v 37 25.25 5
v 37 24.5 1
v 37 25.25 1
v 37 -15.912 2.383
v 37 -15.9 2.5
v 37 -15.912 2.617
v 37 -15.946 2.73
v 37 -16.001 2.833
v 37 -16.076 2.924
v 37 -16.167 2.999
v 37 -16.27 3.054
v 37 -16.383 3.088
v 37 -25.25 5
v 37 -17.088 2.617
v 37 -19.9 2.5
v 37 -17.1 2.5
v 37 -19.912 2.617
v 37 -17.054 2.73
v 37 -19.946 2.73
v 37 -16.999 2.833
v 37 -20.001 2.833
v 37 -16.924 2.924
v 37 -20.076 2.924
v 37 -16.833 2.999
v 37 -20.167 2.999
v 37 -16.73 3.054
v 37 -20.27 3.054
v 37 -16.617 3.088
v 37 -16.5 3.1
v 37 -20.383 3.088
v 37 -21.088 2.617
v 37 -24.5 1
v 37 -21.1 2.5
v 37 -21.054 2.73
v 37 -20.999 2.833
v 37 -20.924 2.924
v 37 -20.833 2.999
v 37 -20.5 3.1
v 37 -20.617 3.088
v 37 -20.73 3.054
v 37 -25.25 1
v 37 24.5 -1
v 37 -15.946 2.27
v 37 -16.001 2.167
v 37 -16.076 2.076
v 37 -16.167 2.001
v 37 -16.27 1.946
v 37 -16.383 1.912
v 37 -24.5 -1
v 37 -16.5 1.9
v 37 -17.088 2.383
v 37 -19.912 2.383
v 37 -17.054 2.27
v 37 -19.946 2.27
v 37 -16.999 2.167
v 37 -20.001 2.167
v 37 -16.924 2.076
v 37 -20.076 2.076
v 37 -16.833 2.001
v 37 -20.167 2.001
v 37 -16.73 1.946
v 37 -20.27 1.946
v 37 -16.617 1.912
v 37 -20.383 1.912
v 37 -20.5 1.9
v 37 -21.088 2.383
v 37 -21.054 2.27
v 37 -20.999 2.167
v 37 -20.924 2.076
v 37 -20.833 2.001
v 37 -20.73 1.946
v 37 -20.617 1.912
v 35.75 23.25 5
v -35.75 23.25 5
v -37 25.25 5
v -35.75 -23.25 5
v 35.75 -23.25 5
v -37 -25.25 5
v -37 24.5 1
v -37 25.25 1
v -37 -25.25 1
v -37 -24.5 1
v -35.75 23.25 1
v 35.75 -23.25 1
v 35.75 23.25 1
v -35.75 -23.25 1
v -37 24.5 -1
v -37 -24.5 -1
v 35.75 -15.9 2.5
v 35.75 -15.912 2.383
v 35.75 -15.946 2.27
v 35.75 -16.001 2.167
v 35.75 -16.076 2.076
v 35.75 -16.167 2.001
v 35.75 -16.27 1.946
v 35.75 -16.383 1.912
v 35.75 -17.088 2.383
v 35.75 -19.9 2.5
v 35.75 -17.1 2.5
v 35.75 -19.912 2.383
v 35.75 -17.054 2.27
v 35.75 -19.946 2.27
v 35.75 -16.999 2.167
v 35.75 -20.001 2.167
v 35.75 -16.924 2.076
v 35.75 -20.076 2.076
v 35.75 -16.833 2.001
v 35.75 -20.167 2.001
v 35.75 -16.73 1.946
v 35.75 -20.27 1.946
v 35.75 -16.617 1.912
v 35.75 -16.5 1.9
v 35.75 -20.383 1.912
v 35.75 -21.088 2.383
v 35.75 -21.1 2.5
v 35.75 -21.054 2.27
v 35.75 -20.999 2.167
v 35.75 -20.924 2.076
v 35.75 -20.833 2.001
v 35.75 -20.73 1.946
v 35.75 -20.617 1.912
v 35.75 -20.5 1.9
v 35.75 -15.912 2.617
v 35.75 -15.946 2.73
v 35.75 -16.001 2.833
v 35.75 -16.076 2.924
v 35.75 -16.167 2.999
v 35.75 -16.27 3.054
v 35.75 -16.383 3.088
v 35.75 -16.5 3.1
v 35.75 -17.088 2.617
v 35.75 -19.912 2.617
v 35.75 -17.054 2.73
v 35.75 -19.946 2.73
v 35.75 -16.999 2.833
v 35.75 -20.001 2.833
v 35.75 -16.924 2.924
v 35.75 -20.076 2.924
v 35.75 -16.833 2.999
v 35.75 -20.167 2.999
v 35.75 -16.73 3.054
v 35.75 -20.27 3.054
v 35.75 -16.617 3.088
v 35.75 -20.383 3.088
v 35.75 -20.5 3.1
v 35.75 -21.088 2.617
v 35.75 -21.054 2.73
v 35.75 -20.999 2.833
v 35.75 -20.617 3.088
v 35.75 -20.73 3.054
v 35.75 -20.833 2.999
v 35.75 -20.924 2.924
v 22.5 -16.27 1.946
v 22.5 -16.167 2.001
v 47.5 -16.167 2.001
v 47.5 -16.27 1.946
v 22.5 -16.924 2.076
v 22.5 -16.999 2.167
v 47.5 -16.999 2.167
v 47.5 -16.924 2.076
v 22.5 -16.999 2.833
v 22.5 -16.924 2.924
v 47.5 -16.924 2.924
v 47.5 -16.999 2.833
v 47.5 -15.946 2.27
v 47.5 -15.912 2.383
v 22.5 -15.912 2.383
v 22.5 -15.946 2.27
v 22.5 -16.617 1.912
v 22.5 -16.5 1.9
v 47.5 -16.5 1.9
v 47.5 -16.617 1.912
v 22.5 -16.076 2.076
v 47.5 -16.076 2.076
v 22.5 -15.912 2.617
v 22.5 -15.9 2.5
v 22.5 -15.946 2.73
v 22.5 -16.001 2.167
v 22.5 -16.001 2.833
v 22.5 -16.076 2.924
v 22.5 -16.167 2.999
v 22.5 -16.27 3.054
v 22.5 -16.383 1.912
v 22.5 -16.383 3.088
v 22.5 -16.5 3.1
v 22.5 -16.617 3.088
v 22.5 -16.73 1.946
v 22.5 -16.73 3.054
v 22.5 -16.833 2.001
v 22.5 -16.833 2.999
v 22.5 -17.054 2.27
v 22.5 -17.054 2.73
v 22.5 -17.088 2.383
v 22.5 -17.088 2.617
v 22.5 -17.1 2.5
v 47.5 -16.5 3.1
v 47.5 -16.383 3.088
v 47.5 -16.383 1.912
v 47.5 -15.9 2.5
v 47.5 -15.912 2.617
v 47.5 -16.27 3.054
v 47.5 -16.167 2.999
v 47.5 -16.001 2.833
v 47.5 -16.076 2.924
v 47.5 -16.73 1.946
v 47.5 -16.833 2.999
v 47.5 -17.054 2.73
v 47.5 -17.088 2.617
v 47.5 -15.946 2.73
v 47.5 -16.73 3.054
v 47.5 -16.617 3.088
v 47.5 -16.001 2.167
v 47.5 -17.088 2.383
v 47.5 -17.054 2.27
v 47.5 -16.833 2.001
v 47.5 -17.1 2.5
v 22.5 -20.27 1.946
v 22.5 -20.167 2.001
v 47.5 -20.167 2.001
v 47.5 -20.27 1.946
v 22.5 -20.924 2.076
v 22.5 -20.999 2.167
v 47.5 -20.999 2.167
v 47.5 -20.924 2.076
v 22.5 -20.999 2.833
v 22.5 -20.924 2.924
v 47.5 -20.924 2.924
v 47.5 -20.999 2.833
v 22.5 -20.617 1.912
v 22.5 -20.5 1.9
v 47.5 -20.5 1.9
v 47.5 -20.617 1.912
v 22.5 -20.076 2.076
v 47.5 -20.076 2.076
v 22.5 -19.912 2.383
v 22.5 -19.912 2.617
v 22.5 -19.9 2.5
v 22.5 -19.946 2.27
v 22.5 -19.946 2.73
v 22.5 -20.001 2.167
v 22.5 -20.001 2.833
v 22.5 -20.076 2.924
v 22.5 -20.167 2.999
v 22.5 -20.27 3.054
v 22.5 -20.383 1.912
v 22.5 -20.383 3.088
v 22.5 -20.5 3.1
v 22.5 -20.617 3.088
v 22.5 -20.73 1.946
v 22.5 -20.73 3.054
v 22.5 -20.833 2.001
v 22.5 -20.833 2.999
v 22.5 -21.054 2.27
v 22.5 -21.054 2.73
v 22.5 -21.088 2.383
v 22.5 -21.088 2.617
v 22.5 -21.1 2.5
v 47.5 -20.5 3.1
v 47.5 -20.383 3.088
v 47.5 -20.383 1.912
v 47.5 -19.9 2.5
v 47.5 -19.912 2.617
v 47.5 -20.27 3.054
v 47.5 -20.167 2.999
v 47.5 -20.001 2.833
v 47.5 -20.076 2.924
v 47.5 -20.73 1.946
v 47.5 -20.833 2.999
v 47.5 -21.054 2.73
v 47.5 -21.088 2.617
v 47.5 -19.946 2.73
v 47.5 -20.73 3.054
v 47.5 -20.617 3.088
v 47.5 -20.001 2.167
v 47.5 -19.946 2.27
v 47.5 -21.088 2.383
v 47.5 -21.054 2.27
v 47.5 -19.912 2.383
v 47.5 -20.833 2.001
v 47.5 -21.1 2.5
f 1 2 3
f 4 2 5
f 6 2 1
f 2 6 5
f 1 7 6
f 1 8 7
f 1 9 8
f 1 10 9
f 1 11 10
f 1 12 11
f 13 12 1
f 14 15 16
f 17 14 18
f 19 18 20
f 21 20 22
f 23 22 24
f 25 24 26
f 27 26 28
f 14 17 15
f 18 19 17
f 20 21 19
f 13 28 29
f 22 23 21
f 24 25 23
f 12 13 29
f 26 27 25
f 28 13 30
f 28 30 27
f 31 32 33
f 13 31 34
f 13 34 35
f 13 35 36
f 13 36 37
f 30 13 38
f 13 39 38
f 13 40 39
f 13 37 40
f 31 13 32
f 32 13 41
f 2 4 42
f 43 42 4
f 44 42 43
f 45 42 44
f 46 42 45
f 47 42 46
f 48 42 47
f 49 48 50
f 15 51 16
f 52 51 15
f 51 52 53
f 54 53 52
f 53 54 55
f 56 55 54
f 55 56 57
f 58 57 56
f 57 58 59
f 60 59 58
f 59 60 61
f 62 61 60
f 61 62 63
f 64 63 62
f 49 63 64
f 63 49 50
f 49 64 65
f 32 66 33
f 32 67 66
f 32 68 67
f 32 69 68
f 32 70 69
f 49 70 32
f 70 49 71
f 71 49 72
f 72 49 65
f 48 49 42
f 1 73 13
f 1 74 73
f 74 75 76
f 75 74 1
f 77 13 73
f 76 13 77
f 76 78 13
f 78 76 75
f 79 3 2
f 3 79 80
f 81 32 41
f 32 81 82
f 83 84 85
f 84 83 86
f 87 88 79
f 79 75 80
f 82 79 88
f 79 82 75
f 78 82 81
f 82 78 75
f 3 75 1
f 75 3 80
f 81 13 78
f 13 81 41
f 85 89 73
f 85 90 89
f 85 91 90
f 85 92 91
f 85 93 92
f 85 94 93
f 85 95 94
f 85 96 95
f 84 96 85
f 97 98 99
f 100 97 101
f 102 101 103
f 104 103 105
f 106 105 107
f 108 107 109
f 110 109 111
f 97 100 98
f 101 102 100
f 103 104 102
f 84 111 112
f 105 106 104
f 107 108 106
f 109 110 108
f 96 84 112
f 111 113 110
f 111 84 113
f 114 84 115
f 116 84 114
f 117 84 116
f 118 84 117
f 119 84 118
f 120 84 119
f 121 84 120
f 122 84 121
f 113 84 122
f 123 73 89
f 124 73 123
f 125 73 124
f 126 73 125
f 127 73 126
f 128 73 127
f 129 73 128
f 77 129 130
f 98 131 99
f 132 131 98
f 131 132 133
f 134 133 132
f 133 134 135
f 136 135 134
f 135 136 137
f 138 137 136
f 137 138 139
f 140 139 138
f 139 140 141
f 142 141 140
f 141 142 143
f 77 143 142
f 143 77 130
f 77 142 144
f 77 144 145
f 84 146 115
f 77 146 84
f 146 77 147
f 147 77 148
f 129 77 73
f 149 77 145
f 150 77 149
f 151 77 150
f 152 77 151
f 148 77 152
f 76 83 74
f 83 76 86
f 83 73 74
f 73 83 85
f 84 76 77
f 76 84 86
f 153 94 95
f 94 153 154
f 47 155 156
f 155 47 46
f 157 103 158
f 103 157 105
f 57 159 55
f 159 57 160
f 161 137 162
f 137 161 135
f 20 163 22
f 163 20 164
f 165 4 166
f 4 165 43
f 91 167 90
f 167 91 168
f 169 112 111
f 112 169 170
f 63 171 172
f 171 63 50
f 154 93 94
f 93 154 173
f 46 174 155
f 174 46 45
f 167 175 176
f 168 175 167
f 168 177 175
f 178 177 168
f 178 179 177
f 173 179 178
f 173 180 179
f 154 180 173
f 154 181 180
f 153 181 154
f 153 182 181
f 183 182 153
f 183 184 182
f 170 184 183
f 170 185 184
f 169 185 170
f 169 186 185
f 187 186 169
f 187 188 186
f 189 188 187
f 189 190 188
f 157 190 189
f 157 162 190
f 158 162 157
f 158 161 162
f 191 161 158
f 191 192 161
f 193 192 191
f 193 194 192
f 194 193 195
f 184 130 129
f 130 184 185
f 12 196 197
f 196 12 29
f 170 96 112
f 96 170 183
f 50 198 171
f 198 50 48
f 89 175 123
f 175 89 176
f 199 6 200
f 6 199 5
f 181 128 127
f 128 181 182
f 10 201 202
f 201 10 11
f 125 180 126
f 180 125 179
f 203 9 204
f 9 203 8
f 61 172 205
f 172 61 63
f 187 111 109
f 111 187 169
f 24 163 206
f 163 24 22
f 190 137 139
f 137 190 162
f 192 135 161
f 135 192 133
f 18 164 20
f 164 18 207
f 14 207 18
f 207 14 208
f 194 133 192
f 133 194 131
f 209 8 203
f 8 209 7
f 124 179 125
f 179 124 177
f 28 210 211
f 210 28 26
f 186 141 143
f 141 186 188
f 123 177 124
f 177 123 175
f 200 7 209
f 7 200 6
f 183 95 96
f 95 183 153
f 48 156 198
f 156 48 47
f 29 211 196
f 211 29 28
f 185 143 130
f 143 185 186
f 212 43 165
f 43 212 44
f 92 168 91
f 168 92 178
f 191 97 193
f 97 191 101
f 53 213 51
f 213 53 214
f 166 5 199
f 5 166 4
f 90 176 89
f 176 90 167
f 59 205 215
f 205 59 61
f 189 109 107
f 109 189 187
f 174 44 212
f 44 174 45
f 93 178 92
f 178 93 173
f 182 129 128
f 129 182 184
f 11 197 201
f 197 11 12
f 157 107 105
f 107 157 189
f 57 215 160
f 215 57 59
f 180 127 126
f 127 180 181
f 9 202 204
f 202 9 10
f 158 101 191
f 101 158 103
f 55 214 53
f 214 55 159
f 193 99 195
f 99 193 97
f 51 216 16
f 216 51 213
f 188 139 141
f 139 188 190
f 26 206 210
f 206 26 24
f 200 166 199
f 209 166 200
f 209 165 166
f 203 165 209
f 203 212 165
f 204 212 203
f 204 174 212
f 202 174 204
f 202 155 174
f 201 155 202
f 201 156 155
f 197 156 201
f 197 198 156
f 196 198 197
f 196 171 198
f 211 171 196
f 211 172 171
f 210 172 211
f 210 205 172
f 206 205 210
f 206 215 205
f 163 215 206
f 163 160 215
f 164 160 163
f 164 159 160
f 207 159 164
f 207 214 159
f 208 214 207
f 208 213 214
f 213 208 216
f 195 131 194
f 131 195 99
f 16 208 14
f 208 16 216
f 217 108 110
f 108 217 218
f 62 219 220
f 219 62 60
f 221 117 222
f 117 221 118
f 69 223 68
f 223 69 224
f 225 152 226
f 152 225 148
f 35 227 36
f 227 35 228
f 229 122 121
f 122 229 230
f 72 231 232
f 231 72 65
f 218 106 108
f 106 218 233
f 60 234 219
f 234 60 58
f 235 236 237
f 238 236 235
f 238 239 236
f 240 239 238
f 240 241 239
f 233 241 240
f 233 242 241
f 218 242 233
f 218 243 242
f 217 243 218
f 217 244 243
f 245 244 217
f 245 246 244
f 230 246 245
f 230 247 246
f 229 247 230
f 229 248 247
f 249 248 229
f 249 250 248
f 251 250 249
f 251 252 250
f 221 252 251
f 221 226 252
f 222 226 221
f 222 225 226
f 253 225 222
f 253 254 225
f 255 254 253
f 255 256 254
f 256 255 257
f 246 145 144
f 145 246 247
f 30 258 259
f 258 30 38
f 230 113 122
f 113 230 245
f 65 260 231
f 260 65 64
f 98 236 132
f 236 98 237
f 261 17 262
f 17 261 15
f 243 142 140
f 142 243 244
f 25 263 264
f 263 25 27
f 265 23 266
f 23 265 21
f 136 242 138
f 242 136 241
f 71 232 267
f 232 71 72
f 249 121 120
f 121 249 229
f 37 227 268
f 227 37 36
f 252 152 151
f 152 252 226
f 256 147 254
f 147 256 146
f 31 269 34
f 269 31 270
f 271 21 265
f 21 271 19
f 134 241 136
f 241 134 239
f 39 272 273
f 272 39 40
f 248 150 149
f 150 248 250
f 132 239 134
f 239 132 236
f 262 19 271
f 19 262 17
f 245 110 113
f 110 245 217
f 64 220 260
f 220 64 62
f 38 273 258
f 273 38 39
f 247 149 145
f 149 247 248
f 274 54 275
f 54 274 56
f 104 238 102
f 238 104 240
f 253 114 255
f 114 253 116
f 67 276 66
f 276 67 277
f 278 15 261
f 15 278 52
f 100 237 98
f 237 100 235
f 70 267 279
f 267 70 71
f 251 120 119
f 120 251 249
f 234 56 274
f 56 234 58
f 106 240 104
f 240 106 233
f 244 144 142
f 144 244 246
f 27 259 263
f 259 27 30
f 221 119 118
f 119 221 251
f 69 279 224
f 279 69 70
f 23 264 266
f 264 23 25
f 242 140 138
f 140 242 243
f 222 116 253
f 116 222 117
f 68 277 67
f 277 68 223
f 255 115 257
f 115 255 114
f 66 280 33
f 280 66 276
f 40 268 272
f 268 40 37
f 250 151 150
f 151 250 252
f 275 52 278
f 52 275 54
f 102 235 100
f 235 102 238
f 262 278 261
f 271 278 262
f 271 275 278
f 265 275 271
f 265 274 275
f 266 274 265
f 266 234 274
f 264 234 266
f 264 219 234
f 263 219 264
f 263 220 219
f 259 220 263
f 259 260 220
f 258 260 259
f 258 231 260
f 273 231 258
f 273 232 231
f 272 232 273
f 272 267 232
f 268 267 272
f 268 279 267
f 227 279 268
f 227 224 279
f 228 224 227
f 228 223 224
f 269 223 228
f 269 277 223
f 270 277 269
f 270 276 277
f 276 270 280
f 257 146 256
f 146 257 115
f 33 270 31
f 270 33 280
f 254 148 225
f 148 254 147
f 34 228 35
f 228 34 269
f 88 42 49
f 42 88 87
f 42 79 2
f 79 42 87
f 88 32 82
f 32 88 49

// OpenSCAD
// file: akkum18650.scad
echo("Ропацкий Евгений Влдаимирович");
d_akkum = 19;
h_akkum = 65;

akkum18650_set();

module akkum18650_set() {
    translate([0, -d_akkum/2-1, d_akkum/2+1])
    rotate([0, 90, 0])
    akkum18650();
    
    translate([0, d_akkum/2+1, d_akkum/2+1])
    rotate([0, 90, 0])
    akkum18650();

    translate([-33, -10, 0])
    import ("flexbatter18650x2.stl");

}
module akkum18650() {
    
    color("purple")
    cylinder(d=18, h=h_akkum, $fn=32, center = true);
    
}
// main file
use <akkum18650.scad>

echo("Работа Ропацкого Евгения!");


fitnes_frame = 4;

d_akkum = 19;
h_akkum = 65;
d_wires = 1.2;

thickness_back = 1;
thickness_walls = 2;
thickness_bottom = 2;

w_back = 70;
h_back = 45;
thicness_back = 1;
h_walls = 4;
gap_backlight = 1.5;



kit_frame();
module wires(){
    translate([w_back/2, -h_back/2+6, h_walls/2+0.5])
    rotate([0, 90, 0])
    color("black")
    cylinder(d=d_wires, h=25, center=true, $fn=32);

    translate([w_back/2, -h_back/2+2, h_walls/2+0.5])
    rotate([0, 90, 0])
    color("red")
    cylinder(d=d_wires, h=25, center=true, $fn=32);
}
module kit_frame(){
    bottom();
    //color("blue")
    translate([0, 0, h_walls/2+thickness_bottom/2])
    walls();
    wires();
}

module walls(){
    difference(){
        cube([w_back + 2*thickness_walls, h_back+2*thickness_walls+gap_backlight, h_walls],center = true);
        color ("red")
        cube([w_back+gap_backlight, h_back+gap_backlight, h_walls +1],center = true);
    }
}
module bottom(){
cube([w_back + 2*thickness_walls, h_back+2*thickness_walls, thickness_bottom],center = true);
}

module backlight() {
    color("lightgreen")
    cube([w_back, h_back, thickness_back], center = true);
}
